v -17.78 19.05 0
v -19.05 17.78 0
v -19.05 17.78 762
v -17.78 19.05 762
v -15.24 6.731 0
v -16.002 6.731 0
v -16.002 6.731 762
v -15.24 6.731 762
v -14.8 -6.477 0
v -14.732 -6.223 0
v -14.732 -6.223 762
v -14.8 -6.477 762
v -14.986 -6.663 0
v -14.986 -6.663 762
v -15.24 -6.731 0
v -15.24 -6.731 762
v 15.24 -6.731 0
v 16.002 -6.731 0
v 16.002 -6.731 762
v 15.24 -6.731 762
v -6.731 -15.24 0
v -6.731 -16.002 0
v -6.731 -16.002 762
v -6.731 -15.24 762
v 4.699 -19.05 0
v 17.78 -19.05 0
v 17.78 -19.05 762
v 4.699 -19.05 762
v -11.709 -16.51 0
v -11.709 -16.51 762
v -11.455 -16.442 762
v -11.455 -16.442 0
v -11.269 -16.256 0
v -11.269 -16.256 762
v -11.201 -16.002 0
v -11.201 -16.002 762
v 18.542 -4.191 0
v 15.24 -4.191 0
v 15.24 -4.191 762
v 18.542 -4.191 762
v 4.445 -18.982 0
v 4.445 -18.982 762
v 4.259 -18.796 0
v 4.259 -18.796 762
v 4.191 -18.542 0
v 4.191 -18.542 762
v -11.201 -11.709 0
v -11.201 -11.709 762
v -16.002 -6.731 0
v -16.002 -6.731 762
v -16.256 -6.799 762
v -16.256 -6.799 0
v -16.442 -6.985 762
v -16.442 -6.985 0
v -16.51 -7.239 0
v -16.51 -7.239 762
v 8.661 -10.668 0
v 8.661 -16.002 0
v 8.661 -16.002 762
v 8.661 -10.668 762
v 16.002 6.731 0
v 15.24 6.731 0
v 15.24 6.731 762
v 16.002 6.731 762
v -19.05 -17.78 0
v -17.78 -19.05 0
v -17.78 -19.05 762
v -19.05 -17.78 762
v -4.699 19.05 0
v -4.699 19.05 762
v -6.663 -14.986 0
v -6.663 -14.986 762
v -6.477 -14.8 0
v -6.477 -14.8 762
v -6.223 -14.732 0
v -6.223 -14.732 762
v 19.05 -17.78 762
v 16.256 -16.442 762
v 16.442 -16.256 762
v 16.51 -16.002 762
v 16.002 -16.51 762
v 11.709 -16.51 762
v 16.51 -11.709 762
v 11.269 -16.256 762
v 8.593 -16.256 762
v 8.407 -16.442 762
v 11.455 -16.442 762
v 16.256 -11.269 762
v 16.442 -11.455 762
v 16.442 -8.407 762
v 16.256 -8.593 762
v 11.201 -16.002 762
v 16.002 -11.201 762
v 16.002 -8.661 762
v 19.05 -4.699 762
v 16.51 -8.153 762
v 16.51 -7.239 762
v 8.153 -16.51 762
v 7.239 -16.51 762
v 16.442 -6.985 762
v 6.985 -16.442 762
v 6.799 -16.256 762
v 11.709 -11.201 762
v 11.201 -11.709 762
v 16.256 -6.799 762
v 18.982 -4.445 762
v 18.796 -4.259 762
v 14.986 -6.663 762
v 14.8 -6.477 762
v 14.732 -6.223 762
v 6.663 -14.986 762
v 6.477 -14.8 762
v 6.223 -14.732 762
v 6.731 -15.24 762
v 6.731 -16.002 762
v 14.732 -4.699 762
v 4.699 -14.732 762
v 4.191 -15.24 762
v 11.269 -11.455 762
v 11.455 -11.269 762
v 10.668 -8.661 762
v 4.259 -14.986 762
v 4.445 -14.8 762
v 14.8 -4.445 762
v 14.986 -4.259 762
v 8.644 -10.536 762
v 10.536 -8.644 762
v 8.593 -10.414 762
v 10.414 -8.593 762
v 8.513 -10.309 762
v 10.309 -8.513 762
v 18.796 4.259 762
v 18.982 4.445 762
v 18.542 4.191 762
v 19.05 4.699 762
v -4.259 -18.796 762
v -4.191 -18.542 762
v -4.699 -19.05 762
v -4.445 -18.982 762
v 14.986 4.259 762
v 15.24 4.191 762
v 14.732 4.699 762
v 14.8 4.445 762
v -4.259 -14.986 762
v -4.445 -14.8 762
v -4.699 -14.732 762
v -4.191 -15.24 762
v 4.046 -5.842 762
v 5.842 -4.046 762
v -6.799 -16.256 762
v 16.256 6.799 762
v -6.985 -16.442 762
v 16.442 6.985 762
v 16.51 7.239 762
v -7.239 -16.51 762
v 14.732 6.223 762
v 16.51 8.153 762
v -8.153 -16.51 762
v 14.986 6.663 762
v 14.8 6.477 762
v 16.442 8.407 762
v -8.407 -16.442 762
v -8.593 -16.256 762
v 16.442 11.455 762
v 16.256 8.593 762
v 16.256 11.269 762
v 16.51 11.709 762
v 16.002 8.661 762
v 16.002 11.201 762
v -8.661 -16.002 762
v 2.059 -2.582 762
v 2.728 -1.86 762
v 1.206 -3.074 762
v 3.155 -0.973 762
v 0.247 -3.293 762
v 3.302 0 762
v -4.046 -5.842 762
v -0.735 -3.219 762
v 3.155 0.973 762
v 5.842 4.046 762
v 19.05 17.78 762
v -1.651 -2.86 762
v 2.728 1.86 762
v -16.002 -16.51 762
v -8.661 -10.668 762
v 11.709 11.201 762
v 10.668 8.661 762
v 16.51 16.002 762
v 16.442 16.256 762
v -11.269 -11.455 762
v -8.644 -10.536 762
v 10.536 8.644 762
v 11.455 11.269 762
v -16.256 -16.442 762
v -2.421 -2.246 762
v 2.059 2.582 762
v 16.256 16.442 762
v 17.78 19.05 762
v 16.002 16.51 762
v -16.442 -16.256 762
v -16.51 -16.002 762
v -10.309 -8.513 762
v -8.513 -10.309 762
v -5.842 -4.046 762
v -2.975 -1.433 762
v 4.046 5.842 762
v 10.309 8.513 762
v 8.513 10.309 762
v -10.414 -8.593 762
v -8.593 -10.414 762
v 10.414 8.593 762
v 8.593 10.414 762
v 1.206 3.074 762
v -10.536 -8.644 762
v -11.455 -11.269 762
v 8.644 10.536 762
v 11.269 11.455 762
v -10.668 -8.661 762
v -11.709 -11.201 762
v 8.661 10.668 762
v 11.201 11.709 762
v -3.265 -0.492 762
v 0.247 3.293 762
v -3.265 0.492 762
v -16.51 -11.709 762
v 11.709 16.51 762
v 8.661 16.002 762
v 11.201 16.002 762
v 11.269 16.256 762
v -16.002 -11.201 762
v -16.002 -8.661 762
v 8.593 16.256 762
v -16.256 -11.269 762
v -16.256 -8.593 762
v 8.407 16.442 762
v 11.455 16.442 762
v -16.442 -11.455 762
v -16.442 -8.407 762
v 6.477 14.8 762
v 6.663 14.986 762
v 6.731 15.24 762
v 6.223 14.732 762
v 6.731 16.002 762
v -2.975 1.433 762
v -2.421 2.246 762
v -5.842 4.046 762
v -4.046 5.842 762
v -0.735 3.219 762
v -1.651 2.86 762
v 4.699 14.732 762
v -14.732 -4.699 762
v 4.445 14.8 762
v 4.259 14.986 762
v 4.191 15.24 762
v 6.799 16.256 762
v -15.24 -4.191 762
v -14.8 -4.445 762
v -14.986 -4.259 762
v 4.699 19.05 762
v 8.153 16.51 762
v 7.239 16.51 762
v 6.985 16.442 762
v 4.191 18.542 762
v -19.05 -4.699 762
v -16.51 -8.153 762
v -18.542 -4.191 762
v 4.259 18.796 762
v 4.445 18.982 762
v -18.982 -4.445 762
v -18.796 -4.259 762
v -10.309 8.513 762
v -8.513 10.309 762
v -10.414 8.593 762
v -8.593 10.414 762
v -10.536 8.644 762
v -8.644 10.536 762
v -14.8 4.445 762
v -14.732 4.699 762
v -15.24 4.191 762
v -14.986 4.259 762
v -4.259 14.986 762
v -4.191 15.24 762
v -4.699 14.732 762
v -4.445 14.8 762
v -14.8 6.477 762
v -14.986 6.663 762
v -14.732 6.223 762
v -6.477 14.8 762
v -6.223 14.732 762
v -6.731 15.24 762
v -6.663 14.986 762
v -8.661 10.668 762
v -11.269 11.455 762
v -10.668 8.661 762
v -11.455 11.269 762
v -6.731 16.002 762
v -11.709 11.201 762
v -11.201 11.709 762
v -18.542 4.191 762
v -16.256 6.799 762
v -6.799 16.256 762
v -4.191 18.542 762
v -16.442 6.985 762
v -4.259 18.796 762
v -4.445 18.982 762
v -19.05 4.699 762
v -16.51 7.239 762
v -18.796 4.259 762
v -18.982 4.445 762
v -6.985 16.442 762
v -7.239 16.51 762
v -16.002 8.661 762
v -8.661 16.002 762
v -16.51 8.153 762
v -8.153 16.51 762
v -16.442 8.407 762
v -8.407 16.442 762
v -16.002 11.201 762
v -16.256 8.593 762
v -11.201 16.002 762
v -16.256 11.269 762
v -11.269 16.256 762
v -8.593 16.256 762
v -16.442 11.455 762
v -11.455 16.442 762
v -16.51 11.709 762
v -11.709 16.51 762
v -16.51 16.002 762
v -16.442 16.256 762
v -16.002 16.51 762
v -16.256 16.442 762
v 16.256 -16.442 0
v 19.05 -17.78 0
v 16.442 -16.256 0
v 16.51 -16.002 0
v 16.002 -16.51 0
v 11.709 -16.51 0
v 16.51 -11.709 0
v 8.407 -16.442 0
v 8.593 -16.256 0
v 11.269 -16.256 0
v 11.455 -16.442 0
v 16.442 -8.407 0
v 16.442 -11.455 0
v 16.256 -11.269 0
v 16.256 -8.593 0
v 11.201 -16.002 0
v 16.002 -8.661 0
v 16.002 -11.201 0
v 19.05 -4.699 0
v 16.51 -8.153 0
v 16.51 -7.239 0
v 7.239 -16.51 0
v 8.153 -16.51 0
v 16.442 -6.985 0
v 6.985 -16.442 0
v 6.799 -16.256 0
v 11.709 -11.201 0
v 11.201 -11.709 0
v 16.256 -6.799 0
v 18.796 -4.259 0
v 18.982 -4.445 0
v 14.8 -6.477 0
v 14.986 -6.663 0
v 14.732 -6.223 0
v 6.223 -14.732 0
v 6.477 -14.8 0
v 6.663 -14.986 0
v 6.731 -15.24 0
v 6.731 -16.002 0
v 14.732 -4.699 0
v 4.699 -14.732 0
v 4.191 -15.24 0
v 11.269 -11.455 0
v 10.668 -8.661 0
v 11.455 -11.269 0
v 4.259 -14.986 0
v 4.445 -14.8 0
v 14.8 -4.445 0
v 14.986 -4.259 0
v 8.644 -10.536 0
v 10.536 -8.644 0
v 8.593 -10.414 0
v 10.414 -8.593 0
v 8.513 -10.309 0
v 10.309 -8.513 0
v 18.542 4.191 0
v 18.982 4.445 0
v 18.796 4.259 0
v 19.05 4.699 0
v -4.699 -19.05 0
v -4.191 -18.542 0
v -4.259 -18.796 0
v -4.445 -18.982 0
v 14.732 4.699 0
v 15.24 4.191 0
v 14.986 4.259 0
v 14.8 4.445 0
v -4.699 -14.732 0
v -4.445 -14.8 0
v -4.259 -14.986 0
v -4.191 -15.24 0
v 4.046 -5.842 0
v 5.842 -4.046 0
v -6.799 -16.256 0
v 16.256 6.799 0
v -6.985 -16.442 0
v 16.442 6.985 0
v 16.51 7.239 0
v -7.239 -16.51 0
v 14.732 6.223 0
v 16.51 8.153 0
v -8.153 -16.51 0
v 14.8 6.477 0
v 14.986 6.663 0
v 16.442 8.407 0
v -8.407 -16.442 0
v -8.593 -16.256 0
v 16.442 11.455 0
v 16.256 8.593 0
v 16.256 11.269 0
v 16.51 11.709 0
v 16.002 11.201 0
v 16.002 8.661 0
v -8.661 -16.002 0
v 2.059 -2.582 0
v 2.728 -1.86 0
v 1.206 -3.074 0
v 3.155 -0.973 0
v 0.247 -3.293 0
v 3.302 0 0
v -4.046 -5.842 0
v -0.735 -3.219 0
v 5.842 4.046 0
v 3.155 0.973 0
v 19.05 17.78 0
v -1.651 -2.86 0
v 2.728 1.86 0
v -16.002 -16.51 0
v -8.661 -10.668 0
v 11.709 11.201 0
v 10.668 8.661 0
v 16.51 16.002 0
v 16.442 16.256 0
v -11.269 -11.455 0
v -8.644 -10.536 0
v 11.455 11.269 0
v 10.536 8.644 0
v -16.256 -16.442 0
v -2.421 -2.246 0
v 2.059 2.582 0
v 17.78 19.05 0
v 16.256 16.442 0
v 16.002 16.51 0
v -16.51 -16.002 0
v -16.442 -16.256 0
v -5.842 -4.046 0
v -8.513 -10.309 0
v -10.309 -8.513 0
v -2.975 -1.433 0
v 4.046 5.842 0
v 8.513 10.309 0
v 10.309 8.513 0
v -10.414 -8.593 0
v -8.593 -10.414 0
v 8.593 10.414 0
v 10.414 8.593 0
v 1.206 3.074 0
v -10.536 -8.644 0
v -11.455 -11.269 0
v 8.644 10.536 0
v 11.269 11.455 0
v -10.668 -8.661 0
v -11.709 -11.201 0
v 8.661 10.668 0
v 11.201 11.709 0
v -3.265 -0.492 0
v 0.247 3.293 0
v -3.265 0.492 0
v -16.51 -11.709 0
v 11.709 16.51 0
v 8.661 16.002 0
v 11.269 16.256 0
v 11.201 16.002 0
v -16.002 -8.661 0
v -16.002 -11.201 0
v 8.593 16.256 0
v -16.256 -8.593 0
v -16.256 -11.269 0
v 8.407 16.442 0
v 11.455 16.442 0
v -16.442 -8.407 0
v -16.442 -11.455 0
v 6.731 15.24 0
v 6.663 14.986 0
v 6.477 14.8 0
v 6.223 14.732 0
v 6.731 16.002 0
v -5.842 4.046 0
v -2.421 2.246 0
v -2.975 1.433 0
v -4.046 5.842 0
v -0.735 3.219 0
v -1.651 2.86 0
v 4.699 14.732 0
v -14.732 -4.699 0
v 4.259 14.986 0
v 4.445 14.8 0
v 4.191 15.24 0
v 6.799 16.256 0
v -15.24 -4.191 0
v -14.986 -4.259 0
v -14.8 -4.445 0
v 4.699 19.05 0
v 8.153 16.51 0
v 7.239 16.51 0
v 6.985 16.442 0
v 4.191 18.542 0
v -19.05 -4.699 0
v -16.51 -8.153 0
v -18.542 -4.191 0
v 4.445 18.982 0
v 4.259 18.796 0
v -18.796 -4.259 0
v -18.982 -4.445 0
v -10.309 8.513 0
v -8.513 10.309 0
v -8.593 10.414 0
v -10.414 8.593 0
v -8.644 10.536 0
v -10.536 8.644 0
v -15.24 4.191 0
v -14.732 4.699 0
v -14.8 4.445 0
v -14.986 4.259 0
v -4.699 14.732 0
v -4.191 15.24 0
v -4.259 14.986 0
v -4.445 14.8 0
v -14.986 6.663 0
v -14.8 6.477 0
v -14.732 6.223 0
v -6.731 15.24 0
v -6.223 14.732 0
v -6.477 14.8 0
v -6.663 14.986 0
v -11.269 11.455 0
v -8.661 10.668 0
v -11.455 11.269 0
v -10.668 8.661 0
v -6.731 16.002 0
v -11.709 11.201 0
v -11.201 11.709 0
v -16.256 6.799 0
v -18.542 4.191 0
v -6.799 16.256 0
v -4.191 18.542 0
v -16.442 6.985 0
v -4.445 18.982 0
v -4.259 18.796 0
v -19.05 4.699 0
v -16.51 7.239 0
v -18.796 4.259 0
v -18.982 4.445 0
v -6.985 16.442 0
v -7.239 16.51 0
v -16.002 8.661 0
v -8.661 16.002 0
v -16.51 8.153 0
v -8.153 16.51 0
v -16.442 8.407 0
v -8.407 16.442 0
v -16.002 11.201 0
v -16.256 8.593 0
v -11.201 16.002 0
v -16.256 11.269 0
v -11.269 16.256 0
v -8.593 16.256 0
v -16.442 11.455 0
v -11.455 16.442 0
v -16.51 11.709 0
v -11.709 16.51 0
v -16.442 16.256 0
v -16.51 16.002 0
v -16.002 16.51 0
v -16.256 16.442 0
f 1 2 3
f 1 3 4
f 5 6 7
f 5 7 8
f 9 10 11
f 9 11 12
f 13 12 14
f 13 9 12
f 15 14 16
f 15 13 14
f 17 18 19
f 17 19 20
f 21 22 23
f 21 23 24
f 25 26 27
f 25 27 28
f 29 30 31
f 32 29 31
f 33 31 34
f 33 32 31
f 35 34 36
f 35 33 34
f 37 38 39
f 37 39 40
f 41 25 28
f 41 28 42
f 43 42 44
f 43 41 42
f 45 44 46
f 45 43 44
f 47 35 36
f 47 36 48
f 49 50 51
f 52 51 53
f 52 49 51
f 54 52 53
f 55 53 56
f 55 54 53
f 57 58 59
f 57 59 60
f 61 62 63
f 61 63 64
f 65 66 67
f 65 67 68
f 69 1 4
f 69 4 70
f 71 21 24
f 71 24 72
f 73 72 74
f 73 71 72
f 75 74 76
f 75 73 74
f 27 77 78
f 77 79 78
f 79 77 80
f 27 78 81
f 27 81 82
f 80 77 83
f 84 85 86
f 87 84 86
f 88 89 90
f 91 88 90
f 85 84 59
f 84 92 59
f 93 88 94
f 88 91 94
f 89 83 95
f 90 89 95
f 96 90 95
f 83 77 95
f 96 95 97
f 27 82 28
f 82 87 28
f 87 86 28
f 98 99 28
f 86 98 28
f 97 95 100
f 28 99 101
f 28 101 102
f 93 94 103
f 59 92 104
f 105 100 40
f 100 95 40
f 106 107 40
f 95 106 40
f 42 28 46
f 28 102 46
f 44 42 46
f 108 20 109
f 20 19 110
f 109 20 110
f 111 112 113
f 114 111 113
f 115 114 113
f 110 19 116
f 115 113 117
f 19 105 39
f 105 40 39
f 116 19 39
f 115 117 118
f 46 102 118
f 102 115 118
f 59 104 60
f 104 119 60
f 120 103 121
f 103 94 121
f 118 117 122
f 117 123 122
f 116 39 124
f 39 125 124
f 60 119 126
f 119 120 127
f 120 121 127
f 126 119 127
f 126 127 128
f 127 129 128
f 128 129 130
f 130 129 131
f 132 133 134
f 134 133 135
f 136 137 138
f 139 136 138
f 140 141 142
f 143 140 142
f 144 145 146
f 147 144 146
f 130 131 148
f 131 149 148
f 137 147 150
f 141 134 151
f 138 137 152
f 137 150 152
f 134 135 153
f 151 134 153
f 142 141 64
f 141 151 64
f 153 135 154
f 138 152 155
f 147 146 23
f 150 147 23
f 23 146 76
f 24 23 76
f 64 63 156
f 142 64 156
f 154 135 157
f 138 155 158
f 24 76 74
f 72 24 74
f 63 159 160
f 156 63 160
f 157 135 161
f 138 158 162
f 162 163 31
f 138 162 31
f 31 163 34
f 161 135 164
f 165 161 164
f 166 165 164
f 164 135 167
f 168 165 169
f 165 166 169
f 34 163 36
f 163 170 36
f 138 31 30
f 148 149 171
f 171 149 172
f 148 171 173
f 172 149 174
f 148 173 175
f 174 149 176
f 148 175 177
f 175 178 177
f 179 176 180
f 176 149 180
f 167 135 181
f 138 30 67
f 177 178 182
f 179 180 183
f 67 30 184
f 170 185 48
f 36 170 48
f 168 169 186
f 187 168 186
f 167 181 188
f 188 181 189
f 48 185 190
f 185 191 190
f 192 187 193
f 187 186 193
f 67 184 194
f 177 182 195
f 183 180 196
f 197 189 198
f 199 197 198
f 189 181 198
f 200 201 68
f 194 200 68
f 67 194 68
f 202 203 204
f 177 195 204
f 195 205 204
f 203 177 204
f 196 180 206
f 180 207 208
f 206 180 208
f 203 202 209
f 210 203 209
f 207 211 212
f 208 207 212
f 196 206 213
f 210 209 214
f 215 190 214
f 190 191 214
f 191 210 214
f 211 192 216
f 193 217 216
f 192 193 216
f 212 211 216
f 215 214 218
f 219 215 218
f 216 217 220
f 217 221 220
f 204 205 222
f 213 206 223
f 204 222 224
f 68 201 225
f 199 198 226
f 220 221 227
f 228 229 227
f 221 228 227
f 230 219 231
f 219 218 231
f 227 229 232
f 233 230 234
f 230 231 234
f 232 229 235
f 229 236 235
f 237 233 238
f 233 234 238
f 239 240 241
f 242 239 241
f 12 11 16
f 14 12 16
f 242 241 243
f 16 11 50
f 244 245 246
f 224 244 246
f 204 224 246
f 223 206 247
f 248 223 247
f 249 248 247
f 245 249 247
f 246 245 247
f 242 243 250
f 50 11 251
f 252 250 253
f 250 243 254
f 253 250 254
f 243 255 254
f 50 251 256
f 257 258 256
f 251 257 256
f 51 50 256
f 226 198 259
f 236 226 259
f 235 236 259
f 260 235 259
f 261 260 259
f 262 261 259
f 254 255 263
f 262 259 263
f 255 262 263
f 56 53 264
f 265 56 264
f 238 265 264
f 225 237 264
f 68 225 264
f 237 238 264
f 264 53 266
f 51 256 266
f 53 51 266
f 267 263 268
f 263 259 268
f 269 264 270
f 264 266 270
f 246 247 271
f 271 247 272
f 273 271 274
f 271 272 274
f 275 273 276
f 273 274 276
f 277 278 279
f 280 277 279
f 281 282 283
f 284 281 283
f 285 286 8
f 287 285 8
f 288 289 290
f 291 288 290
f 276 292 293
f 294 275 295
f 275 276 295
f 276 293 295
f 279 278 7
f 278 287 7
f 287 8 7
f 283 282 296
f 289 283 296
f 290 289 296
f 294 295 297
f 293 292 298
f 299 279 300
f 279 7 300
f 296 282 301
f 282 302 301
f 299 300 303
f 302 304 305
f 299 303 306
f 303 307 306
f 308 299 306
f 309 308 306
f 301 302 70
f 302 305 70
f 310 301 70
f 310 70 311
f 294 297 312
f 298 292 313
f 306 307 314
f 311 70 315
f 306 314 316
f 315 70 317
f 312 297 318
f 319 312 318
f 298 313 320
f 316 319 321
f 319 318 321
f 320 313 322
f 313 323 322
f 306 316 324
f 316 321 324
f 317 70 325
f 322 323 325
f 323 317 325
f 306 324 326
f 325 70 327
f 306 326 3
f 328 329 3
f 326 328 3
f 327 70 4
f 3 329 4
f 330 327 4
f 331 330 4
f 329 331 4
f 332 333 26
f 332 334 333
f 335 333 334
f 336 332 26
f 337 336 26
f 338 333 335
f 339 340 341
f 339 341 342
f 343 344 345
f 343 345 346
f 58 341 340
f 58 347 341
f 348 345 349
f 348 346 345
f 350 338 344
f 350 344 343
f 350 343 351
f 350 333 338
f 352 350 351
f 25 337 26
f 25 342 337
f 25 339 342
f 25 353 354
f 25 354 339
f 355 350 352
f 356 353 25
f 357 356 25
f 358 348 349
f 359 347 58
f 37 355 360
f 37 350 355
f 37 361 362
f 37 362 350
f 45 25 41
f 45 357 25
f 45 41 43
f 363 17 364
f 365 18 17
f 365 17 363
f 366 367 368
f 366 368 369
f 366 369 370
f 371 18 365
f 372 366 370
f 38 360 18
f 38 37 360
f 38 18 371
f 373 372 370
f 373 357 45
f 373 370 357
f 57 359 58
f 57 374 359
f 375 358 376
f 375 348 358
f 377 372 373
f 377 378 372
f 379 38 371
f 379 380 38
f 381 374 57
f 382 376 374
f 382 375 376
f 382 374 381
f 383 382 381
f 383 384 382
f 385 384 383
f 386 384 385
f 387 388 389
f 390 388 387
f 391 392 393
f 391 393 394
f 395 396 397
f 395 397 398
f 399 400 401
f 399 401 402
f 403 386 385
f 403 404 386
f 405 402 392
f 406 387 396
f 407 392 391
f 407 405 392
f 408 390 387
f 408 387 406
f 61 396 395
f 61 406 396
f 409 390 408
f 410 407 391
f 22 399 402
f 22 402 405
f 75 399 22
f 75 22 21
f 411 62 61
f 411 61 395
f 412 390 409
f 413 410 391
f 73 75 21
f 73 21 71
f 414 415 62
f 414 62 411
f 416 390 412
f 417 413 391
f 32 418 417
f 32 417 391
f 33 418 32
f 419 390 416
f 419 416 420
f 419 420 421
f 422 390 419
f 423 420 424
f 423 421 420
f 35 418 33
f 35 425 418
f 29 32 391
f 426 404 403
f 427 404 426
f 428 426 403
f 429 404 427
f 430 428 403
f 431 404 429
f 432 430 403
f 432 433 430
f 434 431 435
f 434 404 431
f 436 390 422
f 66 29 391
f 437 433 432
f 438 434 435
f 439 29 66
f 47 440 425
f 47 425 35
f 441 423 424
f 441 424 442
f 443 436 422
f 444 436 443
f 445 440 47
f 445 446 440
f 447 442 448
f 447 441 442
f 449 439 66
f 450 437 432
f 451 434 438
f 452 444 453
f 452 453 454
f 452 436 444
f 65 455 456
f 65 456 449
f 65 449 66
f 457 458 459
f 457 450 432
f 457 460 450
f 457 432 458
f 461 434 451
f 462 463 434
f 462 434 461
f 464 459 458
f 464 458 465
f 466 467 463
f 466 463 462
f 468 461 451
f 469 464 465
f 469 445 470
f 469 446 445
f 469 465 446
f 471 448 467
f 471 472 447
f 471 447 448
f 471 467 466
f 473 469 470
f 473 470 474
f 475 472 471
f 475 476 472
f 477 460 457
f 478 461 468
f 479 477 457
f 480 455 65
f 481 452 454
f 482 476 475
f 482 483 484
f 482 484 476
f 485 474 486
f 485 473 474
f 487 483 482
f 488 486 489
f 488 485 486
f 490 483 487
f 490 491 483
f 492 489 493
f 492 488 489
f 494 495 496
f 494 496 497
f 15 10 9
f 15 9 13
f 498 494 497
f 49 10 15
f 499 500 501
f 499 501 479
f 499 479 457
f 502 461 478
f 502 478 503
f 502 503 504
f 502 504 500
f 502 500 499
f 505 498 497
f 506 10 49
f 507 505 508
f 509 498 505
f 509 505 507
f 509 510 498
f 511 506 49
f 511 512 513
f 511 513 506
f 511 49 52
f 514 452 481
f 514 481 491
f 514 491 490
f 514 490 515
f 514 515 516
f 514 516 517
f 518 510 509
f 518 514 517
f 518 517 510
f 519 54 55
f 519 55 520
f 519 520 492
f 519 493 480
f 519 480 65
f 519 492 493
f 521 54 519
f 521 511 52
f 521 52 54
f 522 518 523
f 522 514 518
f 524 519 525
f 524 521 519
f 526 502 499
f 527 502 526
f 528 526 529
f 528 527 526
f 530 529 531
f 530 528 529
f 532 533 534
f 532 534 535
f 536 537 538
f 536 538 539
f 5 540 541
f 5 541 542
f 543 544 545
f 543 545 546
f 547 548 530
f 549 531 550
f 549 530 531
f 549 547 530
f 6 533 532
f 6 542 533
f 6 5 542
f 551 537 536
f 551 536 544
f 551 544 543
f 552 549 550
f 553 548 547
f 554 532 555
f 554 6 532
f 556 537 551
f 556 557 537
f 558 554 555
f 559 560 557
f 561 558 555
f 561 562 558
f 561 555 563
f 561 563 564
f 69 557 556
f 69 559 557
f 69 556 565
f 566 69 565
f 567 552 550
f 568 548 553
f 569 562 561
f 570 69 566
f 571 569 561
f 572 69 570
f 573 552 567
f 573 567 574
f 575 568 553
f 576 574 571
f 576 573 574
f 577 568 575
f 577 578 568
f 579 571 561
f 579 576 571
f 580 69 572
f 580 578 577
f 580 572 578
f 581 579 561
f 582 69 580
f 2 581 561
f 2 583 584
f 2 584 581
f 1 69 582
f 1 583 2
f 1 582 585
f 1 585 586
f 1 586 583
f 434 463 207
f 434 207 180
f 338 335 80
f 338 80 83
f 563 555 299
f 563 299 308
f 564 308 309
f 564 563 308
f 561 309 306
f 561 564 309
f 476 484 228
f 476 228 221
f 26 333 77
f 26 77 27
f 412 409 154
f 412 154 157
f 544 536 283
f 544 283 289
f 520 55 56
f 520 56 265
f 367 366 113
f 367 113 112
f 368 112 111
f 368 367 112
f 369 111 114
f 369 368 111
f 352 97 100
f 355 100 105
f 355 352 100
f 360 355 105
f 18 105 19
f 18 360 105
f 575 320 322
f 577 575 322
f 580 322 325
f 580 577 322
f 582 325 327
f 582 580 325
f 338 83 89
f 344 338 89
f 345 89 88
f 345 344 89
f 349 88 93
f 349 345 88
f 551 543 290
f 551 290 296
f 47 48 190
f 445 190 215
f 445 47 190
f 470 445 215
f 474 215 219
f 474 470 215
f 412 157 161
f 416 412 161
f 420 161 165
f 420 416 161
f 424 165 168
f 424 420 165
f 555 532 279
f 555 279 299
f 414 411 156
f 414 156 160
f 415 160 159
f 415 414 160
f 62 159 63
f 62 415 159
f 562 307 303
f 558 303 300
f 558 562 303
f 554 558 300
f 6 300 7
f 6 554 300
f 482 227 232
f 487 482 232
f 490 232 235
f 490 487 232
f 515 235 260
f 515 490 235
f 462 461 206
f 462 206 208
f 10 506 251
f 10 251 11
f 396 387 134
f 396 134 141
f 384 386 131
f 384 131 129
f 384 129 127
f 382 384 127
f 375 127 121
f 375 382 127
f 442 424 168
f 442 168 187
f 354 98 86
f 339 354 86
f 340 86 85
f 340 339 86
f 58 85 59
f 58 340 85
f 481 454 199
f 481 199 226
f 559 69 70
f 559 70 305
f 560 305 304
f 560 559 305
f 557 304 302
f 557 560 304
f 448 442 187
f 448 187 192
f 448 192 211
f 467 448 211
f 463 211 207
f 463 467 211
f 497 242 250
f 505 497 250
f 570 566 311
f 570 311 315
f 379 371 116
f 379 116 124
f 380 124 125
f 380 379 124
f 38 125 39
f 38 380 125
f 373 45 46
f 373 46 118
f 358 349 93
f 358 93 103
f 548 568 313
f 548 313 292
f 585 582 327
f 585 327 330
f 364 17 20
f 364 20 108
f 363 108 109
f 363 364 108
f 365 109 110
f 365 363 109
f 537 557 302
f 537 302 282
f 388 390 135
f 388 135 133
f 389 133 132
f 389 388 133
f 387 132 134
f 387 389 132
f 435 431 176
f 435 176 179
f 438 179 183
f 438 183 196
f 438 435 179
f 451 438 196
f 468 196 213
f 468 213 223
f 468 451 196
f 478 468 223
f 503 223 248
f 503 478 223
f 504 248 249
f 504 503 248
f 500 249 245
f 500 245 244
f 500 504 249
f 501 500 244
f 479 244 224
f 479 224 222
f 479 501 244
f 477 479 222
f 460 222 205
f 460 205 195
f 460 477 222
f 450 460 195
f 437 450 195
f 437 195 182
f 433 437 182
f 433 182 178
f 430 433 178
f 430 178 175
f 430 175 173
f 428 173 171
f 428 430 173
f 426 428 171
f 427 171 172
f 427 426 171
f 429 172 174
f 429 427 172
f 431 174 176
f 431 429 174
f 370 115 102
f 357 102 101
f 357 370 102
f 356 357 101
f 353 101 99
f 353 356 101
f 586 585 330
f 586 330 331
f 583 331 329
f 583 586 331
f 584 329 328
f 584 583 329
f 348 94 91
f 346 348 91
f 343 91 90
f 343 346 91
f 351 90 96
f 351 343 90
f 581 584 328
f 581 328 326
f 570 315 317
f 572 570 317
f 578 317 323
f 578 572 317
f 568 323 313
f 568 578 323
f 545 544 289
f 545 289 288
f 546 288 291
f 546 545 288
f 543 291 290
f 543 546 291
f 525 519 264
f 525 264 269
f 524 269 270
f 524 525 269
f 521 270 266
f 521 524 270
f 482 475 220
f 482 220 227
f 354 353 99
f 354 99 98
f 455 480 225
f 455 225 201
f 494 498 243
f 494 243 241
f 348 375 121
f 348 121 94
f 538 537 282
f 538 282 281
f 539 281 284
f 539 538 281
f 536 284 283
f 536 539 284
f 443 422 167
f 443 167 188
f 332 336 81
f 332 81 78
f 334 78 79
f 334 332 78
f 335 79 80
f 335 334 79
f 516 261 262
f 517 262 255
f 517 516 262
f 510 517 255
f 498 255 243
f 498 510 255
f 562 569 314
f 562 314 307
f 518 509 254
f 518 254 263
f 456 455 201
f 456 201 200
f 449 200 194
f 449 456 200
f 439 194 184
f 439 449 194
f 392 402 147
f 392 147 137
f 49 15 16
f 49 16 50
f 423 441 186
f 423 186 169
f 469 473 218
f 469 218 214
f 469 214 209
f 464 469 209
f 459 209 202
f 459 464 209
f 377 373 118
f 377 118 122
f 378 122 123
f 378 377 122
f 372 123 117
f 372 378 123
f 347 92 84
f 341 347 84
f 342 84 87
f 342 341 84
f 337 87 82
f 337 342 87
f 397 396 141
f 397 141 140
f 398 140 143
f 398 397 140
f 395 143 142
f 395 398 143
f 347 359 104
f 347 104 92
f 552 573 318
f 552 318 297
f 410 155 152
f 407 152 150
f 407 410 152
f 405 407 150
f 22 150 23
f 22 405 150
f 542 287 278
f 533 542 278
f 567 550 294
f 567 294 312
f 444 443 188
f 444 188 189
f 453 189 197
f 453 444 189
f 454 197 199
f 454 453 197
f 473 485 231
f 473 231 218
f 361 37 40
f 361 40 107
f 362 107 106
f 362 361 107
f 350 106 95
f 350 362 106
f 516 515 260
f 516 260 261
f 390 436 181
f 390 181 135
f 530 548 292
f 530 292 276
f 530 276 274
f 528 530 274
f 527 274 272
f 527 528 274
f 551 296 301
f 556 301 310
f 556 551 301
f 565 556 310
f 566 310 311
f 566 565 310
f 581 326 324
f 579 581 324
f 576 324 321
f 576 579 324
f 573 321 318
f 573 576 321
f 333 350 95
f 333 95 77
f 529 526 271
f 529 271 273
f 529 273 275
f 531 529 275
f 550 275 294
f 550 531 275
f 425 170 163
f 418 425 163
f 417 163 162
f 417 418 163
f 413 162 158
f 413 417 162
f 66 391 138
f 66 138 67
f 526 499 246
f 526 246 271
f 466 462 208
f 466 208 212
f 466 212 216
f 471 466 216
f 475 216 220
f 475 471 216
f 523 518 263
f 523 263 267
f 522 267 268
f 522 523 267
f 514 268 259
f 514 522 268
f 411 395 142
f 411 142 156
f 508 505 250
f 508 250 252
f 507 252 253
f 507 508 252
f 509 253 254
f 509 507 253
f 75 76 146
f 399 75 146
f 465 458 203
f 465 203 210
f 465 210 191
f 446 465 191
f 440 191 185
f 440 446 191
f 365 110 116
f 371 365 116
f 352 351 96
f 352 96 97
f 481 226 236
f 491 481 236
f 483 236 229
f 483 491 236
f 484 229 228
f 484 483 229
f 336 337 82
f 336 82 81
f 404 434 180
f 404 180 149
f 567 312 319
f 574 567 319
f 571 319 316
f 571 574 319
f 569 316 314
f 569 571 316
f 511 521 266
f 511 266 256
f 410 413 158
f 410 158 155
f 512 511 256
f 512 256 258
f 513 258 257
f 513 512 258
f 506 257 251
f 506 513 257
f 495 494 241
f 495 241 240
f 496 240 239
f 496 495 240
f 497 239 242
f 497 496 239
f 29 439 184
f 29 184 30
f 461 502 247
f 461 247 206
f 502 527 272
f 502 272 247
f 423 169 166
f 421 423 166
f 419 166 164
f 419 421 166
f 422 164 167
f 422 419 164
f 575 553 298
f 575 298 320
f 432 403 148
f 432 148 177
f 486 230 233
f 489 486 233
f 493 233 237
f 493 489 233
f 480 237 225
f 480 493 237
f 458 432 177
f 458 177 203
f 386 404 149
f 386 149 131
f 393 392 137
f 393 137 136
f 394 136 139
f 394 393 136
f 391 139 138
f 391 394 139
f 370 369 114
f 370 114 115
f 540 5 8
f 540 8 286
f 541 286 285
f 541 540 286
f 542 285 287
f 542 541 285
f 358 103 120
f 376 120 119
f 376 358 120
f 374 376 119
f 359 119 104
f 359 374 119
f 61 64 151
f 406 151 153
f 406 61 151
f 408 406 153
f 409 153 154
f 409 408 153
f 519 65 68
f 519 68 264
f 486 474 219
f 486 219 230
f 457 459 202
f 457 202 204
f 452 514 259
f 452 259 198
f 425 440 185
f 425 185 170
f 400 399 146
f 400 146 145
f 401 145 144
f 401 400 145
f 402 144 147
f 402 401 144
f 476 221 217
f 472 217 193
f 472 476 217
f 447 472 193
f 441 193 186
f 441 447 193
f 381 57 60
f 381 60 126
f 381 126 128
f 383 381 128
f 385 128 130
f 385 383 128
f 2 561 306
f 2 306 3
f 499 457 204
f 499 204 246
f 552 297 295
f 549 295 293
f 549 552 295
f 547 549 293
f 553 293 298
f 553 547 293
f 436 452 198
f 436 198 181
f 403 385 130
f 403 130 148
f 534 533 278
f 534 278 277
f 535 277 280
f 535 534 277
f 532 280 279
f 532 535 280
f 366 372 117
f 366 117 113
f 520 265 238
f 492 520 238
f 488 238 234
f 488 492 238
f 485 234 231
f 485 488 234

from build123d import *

# Parameters (mm, degrees)
SKETCH1_R      = 3.302
EXTRUDE1_DEPTH = 762


with BuildPart() as part:
    # Sketch1 → Extrude1 (new body)
    with BuildSketch(Plane.XY):
        with BuildLine():
            Line((4.699, 19.05), (17.78, 19.05))
            Line((17.78, 19.05), (19.05, 17.78))
            Line((19.05, 17.78), (19.05, 4.699))
            ThreePointArc((19.05, 4.699), (18.901210245, 4.339789755), (18.542, 4.191))
            Line((18.542, 4.191), (15.24, 4.191))
            ThreePointArc((15.24, 4.191), (14.880789755, 4.339789755), (14.732, 4.699))
            Line((14.732, 4.699), (14.732, 6.223))
            ThreePointArc((14.732, 6.223), (14.880789755, 6.582210245), (15.24, 6.731))
            Line((15.24, 6.731), (16.002, 6.731))
            ThreePointArc((16.002, 6.731), (16.361210245, 6.879789755), (16.51, 7.239))
            Line((16.51, 7.239), (16.51, 8.1534))
            ThreePointArc((16.51, 8.1534), (16.361210245, 8.512610245), (16.002, 8.6614))
            Line((16.002, 8.6614), (10.667871762, 8.6614))
            ThreePointArc((10.667871762, 8.6614), (10.473468578, 8.622730803), (10.308661517, 8.512610245))
            Line((10.308661517, 8.512610245), (5.842, 4.045948728))
            Line((5.842, 4.045948728), (5.842, -4.045948728))
            Line((5.842, -4.045948728), (10.308661517, -8.512610245))
            ThreePointArc((10.308661517, -8.512610245), (10.473468578, -8.622730803), (10.667871762, -8.6614))
            Line((10.667871762, -8.6614), (16.002, -8.6614))
            ThreePointArc((16.002, -8.6614), (16.361210245, -8.512610245), (16.51, -8.1534))
            Line((16.51, -8.1534), (16.51, -7.239))
            ThreePointArc((16.51, -7.239), (16.361210245, -6.879789755), (16.002, -6.731))
            Line((16.002, -6.731), (15.24, -6.731))
            ThreePointArc((15.24, -6.731), (14.880789755, -6.582210245), (14.732, -6.223))
            Line((14.732, -6.223), (14.732, -4.699))
            ThreePointArc((14.732, -4.699), (14.880789755, -4.339789755), (15.24, -4.191))
            Line((15.24, -4.191), (18.542, -4.191))
            ThreePointArc((18.542, -4.191), (18.901210245, -4.339789755), (19.05, -4.699))
            Line((19.05, -4.699), (19.05, -17.78))
            Line((19.05, -17.78), (17.78, -19.05))
            Line((17.78, -19.05), (4.699, -19.05))
            ThreePointArc((4.699, -19.05), (4.339789755, -18.901210245), (4.191, -18.542))
            Line((4.191, -18.542), (4.191, -15.24))
            ThreePointArc((4.191, -15.24), (4.339789755, -14.880789755), (4.699, -14.732))
            Line((4.699, -14.732), (6.223, -14.732))
            ThreePointArc((6.223, -14.732), (6.582210245, -14.880789755), (6.731, -15.24))
            Line((6.731, -15.24), (6.731, -16.002))
            ThreePointArc((6.731, -16.002), (6.879789755, -16.361210245), (7.239, -16.51))
            Line((7.239, -16.51), (8.1534, -16.51))
            ThreePointArc((8.1534, -16.51), (8.512610245, -16.361210245), (8.6614, -16.002))
            Line((8.6614, -16.002), (8.6614, -10.667871762))
            ThreePointArc((8.6614, -10.667871762), (8.622730803, -10.473468578), (8.512610245, -10.308661517))
            Line((8.512610245, -10.308661517), (4.045948728, -5.842))
            Line((4.045948728, -5.842), (-4.045948728, -5.842))
            Line((-4.045948728, -5.842), (-8.512610245, -10.308661517))
            ThreePointArc((-8.512610245, -10.308661517), (-8.622730803, -10.473468578), (-8.6614, -10.667871762))
            Line((-8.6614, -10.667871762), (-8.6614, -16.002))
            ThreePointArc((-8.6614, -16.002), (-8.512610245, -16.361210245), (-8.1534, -16.51))
            Line((-8.1534, -16.51), (-7.239, -16.51))
            ThreePointArc((-7.239, -16.51), (-6.879789755, -16.361210245), (-6.731, -16.002))
            Line((-6.731, -16.002), (-6.731, -15.24))
            ThreePointArc((-6.731, -15.24), (-6.582210245, -14.880789755), (-6.223, -14.732))
            Line((-6.223, -14.732), (-4.699, -14.732))
            ThreePointArc((-4.699, -14.732), (-4.339789755, -14.880789755), (-4.191, -15.24))
            Line((-4.191, -15.24), (-4.191, -18.542))
            ThreePointArc((-4.191, -18.542), (-4.339789755, -18.901210245), (-4.699, -19.05))
            Line((-4.699, -19.05), (-17.78, -19.05))
            Line((-17.78, -19.05), (-19.05, -17.78))
            Line((-19.05, -17.78), (-19.05, -4.699))
            ThreePointArc((-19.05, -4.699), (-18.901210245, -4.339789755), (-18.542, -4.191))
            Line((-18.542, -4.191), (-15.24, -4.191))
            ThreePointArc((-15.24, -4.191), (-14.880789755, -4.339789755), (-14.732, -4.699))
            Line((-14.732, -4.699), (-14.732, -6.223))
            ThreePointArc((-14.732, -6.223), (-14.880789755, -6.582210245), (-15.24, -6.731))
            Line((-15.24, -6.731), (-16.002, -6.731))
            ThreePointArc((-16.002, -6.731), (-16.361210245, -6.879789755), (-16.51, -7.239))
            Line((-16.51, -7.239), (-16.51, -8.1534))
            ThreePointArc((-16.51, -8.1534), (-16.361210245, -8.512610245), (-16.002, -8.6614))
            Line((-16.002, -8.6614), (-10.667871762, -8.6614))
            ThreePointArc((-10.667871762, -8.6614), (-10.473468578, -8.622730803), (-10.308661517, -8.512610245))
            Line((-10.308661517, -8.512610245), (-5.842, -4.045948728))
            Line((-5.842, -4.045948728), (-5.842, 4.045948728))
            Line((-5.842, 4.045948728), (-10.308661517, 8.512610245))
            ThreePointArc((-10.308661517, 8.512610245), (-10.473468578, 8.622730803), (-10.667871762, 8.6614))
            Line((-10.667871762, 8.6614), (-16.002, 8.6614))
            ThreePointArc((-16.002, 8.6614), (-16.361210245, 8.512610245), (-16.51, 8.1534))
            Line((-16.51, 8.1534), (-16.51, 7.239))
            ThreePointArc((-16.51, 7.239), (-16.361210245, 6.879789755), (-16.002, 6.731))
            Line((-16.002, 6.731), (-15.24, 6.731))
            ThreePointArc((-15.24, 6.731), (-14.880789755, 6.582210245), (-14.732, 6.223))
            Line((-14.732, 6.223), (-14.732, 4.699))
            ThreePointArc((-14.732, 4.699), (-14.880789755, 4.339789755), (-15.24, 4.191))
            Line((-15.24, 4.191), (-18.542, 4.191))
            ThreePointArc((-18.542, 4.191), (-18.901210245, 4.339789755), (-19.05, 4.699))
            Line((-19.05, 4.699), (-19.05, 17.78))
            Line((-19.05, 17.78), (-17.78, 19.05))
            Line((-17.78, 19.05), (-4.699, 19.05))
            ThreePointArc((-4.699, 19.05), (-4.339789755, 18.901210245), (-4.191, 18.542))
            Line((-4.191, 18.542), (-4.191, 15.24))
            ThreePointArc((-4.191, 15.24), (-4.339789755, 14.880789755), (-4.699, 14.732))
            Line((-4.699, 14.732), (-6.223, 14.732))
            ThreePointArc((-6.223, 14.732), (-6.582210245, 14.880789755), (-6.731, 15.24))
            Line((-6.731, 15.24), (-6.731, 16.002))
            ThreePointArc((-6.731, 16.002), (-6.879789755, 16.361210245), (-7.239, 16.51))
            Line((-7.239, 16.51), (-8.1534, 16.51))
            ThreePointArc((-8.1534, 16.51), (-8.512610245, 16.361210245), (-8.6614, 16.002))
            Line((-8.6614, 16.002), (-8.6614, 10.667871762))
            ThreePointArc((-8.6614, 10.667871762), (-8.622730803, 10.473468578), (-8.512610245, 10.308661517))
            Line((-8.512610245, 10.308661517), (-4.045948728, 5.842))
            Line((-4.045948728, 5.842), (4.045948728, 5.842))
            Line((4.045948728, 5.842), (8.512610245, 10.308661517))
            ThreePointArc((8.512610245, 10.308661517), (8.622730803, 10.473468578), (8.6614, 10.667871762))
            Line((8.6614, 10.667871762), (8.6614, 16.002))
            ThreePointArc((8.6614, 16.002), (8.512610245, 16.361210245), (8.1534, 16.51))
            Line((8.1534, 16.51), (7.239, 16.51))
            ThreePointArc((7.239, 16.51), (6.879789755, 16.361210245), (6.731, 16.002))
            Line((6.731, 16.002), (6.731, 15.24))
            ThreePointArc((6.731, 15.24), (6.582210245, 14.880789755), (6.223, 14.732))
            Line((6.223, 14.732), (4.699, 14.732))
            ThreePointArc((4.699, 14.732), (4.339789755, 14.880789755), (4.191, 15.24))
            Line((4.191, 15.24), (4.191, 18.542))
            ThreePointArc((4.191, 18.542), (4.339789755, 18.901210245), (4.699, 19.05))
        make_face()
        Circle(SKETCH1_R, mode=Mode.SUBTRACT)
        with BuildLine():
            Line((11.2014, 16.002), (11.2014, 11.7094))
            ThreePointArc((11.2014, 11.7094), (11.350189755, 11.350189755), (11.7094, 11.2014))
            Line((11.7094, 11.2014), (16.002, 11.2014))
            ThreePointArc((16.002, 11.2014), (16.361210245, 11.350189755), (16.51, 11.7094))
            Line((16.51, 11.7094), (16.51, 16.002))
            ThreePointArc((16.51, 16.002), (16.361210245, 16.361210245), (16.002, 16.51))
            Line((16.002, 16.51), (11.7094, 16.51))
            ThreePointArc((11.7094, 16.51), (11.350189755, 16.361210245), (11.2014, 16.002))
        make_face(mode=Mode.SUBTRACT)
        with BuildLine():
            Line((-16.002, 11.2014), (-11.7094, 11.2014))
            ThreePointArc((-11.7094, 11.2014), (-11.350189755, 11.350189755), (-11.2014, 11.7094))
            Line((-11.2014, 11.7094), (-11.2014, 16.002))
            ThreePointArc((-11.2014, 16.002), (-11.350189755, 16.361210245), (-11.7094, 16.51))
            Line((-11.7094, 16.51), (-16.002, 16.51))
            ThreePointArc((-16.002, 16.51), (-16.361210245, 16.361210245), (-16.51, 16.002))
            Line((-16.51, 16.002), (-16.51, 11.7094))
            ThreePointArc((-16.51, 11.7094), (-16.361210245, 11.350189755), (-16.002, 11.2014))
        make_face(mode=Mode.SUBTRACT)
        with BuildLine():
            Line((-11.2014, -16.002), (-11.2014, -11.7094))
            ThreePointArc((-11.2014, -11.7094), (-11.350189755, -11.350189755), (-11.7094, -11.2014))
            Line((-11.7094, -11.2014), (-16.002, -11.2014))
            ThreePointArc((-16.002, -11.2014), (-16.361210245, -11.350189755), (-16.51, -11.7094))
            Line((-16.51, -11.7094), (-16.51, -16.002))
            ThreePointArc((-16.51, -16.002), (-16.361210245, -16.361210245), (-16.002, -16.51))
            Line((-16.002, -16.51), (-11.7094, -16.51))
            ThreePointArc((-11.7094, -16.51), (-11.350189755, -16.361210245), (-11.2014, -16.002))
        make_face(mode=Mode.SUBTRACT)
        with BuildLine():
            Line((16.002, -11.2014), (11.7094, -11.2014))
            ThreePointArc((11.7094, -11.2014), (11.350189755, -11.350189755), (11.2014, -11.7094))
            Line((11.2014, -11.7094), (11.2014, -16.002))
            ThreePointArc((11.2014, -16.002), (11.350189755, -16.361210245), (11.7094, -16.51))
            Line((11.7094, -16.51), (16.002, -16.51))
            ThreePointArc((16.002, -16.51), (16.361210245, -16.361210245), (16.51, -16.002))
            Line((16.51, -16.002), (16.51, -11.7094))
            ThreePointArc((16.51, -11.7094), (16.361210245, -11.350189755), (16.002, -11.2014))
        make_face(mode=Mode.SUBTRACT)
    extrude(amount=EXTRUDE1_DEPTH)


solid = part.part
